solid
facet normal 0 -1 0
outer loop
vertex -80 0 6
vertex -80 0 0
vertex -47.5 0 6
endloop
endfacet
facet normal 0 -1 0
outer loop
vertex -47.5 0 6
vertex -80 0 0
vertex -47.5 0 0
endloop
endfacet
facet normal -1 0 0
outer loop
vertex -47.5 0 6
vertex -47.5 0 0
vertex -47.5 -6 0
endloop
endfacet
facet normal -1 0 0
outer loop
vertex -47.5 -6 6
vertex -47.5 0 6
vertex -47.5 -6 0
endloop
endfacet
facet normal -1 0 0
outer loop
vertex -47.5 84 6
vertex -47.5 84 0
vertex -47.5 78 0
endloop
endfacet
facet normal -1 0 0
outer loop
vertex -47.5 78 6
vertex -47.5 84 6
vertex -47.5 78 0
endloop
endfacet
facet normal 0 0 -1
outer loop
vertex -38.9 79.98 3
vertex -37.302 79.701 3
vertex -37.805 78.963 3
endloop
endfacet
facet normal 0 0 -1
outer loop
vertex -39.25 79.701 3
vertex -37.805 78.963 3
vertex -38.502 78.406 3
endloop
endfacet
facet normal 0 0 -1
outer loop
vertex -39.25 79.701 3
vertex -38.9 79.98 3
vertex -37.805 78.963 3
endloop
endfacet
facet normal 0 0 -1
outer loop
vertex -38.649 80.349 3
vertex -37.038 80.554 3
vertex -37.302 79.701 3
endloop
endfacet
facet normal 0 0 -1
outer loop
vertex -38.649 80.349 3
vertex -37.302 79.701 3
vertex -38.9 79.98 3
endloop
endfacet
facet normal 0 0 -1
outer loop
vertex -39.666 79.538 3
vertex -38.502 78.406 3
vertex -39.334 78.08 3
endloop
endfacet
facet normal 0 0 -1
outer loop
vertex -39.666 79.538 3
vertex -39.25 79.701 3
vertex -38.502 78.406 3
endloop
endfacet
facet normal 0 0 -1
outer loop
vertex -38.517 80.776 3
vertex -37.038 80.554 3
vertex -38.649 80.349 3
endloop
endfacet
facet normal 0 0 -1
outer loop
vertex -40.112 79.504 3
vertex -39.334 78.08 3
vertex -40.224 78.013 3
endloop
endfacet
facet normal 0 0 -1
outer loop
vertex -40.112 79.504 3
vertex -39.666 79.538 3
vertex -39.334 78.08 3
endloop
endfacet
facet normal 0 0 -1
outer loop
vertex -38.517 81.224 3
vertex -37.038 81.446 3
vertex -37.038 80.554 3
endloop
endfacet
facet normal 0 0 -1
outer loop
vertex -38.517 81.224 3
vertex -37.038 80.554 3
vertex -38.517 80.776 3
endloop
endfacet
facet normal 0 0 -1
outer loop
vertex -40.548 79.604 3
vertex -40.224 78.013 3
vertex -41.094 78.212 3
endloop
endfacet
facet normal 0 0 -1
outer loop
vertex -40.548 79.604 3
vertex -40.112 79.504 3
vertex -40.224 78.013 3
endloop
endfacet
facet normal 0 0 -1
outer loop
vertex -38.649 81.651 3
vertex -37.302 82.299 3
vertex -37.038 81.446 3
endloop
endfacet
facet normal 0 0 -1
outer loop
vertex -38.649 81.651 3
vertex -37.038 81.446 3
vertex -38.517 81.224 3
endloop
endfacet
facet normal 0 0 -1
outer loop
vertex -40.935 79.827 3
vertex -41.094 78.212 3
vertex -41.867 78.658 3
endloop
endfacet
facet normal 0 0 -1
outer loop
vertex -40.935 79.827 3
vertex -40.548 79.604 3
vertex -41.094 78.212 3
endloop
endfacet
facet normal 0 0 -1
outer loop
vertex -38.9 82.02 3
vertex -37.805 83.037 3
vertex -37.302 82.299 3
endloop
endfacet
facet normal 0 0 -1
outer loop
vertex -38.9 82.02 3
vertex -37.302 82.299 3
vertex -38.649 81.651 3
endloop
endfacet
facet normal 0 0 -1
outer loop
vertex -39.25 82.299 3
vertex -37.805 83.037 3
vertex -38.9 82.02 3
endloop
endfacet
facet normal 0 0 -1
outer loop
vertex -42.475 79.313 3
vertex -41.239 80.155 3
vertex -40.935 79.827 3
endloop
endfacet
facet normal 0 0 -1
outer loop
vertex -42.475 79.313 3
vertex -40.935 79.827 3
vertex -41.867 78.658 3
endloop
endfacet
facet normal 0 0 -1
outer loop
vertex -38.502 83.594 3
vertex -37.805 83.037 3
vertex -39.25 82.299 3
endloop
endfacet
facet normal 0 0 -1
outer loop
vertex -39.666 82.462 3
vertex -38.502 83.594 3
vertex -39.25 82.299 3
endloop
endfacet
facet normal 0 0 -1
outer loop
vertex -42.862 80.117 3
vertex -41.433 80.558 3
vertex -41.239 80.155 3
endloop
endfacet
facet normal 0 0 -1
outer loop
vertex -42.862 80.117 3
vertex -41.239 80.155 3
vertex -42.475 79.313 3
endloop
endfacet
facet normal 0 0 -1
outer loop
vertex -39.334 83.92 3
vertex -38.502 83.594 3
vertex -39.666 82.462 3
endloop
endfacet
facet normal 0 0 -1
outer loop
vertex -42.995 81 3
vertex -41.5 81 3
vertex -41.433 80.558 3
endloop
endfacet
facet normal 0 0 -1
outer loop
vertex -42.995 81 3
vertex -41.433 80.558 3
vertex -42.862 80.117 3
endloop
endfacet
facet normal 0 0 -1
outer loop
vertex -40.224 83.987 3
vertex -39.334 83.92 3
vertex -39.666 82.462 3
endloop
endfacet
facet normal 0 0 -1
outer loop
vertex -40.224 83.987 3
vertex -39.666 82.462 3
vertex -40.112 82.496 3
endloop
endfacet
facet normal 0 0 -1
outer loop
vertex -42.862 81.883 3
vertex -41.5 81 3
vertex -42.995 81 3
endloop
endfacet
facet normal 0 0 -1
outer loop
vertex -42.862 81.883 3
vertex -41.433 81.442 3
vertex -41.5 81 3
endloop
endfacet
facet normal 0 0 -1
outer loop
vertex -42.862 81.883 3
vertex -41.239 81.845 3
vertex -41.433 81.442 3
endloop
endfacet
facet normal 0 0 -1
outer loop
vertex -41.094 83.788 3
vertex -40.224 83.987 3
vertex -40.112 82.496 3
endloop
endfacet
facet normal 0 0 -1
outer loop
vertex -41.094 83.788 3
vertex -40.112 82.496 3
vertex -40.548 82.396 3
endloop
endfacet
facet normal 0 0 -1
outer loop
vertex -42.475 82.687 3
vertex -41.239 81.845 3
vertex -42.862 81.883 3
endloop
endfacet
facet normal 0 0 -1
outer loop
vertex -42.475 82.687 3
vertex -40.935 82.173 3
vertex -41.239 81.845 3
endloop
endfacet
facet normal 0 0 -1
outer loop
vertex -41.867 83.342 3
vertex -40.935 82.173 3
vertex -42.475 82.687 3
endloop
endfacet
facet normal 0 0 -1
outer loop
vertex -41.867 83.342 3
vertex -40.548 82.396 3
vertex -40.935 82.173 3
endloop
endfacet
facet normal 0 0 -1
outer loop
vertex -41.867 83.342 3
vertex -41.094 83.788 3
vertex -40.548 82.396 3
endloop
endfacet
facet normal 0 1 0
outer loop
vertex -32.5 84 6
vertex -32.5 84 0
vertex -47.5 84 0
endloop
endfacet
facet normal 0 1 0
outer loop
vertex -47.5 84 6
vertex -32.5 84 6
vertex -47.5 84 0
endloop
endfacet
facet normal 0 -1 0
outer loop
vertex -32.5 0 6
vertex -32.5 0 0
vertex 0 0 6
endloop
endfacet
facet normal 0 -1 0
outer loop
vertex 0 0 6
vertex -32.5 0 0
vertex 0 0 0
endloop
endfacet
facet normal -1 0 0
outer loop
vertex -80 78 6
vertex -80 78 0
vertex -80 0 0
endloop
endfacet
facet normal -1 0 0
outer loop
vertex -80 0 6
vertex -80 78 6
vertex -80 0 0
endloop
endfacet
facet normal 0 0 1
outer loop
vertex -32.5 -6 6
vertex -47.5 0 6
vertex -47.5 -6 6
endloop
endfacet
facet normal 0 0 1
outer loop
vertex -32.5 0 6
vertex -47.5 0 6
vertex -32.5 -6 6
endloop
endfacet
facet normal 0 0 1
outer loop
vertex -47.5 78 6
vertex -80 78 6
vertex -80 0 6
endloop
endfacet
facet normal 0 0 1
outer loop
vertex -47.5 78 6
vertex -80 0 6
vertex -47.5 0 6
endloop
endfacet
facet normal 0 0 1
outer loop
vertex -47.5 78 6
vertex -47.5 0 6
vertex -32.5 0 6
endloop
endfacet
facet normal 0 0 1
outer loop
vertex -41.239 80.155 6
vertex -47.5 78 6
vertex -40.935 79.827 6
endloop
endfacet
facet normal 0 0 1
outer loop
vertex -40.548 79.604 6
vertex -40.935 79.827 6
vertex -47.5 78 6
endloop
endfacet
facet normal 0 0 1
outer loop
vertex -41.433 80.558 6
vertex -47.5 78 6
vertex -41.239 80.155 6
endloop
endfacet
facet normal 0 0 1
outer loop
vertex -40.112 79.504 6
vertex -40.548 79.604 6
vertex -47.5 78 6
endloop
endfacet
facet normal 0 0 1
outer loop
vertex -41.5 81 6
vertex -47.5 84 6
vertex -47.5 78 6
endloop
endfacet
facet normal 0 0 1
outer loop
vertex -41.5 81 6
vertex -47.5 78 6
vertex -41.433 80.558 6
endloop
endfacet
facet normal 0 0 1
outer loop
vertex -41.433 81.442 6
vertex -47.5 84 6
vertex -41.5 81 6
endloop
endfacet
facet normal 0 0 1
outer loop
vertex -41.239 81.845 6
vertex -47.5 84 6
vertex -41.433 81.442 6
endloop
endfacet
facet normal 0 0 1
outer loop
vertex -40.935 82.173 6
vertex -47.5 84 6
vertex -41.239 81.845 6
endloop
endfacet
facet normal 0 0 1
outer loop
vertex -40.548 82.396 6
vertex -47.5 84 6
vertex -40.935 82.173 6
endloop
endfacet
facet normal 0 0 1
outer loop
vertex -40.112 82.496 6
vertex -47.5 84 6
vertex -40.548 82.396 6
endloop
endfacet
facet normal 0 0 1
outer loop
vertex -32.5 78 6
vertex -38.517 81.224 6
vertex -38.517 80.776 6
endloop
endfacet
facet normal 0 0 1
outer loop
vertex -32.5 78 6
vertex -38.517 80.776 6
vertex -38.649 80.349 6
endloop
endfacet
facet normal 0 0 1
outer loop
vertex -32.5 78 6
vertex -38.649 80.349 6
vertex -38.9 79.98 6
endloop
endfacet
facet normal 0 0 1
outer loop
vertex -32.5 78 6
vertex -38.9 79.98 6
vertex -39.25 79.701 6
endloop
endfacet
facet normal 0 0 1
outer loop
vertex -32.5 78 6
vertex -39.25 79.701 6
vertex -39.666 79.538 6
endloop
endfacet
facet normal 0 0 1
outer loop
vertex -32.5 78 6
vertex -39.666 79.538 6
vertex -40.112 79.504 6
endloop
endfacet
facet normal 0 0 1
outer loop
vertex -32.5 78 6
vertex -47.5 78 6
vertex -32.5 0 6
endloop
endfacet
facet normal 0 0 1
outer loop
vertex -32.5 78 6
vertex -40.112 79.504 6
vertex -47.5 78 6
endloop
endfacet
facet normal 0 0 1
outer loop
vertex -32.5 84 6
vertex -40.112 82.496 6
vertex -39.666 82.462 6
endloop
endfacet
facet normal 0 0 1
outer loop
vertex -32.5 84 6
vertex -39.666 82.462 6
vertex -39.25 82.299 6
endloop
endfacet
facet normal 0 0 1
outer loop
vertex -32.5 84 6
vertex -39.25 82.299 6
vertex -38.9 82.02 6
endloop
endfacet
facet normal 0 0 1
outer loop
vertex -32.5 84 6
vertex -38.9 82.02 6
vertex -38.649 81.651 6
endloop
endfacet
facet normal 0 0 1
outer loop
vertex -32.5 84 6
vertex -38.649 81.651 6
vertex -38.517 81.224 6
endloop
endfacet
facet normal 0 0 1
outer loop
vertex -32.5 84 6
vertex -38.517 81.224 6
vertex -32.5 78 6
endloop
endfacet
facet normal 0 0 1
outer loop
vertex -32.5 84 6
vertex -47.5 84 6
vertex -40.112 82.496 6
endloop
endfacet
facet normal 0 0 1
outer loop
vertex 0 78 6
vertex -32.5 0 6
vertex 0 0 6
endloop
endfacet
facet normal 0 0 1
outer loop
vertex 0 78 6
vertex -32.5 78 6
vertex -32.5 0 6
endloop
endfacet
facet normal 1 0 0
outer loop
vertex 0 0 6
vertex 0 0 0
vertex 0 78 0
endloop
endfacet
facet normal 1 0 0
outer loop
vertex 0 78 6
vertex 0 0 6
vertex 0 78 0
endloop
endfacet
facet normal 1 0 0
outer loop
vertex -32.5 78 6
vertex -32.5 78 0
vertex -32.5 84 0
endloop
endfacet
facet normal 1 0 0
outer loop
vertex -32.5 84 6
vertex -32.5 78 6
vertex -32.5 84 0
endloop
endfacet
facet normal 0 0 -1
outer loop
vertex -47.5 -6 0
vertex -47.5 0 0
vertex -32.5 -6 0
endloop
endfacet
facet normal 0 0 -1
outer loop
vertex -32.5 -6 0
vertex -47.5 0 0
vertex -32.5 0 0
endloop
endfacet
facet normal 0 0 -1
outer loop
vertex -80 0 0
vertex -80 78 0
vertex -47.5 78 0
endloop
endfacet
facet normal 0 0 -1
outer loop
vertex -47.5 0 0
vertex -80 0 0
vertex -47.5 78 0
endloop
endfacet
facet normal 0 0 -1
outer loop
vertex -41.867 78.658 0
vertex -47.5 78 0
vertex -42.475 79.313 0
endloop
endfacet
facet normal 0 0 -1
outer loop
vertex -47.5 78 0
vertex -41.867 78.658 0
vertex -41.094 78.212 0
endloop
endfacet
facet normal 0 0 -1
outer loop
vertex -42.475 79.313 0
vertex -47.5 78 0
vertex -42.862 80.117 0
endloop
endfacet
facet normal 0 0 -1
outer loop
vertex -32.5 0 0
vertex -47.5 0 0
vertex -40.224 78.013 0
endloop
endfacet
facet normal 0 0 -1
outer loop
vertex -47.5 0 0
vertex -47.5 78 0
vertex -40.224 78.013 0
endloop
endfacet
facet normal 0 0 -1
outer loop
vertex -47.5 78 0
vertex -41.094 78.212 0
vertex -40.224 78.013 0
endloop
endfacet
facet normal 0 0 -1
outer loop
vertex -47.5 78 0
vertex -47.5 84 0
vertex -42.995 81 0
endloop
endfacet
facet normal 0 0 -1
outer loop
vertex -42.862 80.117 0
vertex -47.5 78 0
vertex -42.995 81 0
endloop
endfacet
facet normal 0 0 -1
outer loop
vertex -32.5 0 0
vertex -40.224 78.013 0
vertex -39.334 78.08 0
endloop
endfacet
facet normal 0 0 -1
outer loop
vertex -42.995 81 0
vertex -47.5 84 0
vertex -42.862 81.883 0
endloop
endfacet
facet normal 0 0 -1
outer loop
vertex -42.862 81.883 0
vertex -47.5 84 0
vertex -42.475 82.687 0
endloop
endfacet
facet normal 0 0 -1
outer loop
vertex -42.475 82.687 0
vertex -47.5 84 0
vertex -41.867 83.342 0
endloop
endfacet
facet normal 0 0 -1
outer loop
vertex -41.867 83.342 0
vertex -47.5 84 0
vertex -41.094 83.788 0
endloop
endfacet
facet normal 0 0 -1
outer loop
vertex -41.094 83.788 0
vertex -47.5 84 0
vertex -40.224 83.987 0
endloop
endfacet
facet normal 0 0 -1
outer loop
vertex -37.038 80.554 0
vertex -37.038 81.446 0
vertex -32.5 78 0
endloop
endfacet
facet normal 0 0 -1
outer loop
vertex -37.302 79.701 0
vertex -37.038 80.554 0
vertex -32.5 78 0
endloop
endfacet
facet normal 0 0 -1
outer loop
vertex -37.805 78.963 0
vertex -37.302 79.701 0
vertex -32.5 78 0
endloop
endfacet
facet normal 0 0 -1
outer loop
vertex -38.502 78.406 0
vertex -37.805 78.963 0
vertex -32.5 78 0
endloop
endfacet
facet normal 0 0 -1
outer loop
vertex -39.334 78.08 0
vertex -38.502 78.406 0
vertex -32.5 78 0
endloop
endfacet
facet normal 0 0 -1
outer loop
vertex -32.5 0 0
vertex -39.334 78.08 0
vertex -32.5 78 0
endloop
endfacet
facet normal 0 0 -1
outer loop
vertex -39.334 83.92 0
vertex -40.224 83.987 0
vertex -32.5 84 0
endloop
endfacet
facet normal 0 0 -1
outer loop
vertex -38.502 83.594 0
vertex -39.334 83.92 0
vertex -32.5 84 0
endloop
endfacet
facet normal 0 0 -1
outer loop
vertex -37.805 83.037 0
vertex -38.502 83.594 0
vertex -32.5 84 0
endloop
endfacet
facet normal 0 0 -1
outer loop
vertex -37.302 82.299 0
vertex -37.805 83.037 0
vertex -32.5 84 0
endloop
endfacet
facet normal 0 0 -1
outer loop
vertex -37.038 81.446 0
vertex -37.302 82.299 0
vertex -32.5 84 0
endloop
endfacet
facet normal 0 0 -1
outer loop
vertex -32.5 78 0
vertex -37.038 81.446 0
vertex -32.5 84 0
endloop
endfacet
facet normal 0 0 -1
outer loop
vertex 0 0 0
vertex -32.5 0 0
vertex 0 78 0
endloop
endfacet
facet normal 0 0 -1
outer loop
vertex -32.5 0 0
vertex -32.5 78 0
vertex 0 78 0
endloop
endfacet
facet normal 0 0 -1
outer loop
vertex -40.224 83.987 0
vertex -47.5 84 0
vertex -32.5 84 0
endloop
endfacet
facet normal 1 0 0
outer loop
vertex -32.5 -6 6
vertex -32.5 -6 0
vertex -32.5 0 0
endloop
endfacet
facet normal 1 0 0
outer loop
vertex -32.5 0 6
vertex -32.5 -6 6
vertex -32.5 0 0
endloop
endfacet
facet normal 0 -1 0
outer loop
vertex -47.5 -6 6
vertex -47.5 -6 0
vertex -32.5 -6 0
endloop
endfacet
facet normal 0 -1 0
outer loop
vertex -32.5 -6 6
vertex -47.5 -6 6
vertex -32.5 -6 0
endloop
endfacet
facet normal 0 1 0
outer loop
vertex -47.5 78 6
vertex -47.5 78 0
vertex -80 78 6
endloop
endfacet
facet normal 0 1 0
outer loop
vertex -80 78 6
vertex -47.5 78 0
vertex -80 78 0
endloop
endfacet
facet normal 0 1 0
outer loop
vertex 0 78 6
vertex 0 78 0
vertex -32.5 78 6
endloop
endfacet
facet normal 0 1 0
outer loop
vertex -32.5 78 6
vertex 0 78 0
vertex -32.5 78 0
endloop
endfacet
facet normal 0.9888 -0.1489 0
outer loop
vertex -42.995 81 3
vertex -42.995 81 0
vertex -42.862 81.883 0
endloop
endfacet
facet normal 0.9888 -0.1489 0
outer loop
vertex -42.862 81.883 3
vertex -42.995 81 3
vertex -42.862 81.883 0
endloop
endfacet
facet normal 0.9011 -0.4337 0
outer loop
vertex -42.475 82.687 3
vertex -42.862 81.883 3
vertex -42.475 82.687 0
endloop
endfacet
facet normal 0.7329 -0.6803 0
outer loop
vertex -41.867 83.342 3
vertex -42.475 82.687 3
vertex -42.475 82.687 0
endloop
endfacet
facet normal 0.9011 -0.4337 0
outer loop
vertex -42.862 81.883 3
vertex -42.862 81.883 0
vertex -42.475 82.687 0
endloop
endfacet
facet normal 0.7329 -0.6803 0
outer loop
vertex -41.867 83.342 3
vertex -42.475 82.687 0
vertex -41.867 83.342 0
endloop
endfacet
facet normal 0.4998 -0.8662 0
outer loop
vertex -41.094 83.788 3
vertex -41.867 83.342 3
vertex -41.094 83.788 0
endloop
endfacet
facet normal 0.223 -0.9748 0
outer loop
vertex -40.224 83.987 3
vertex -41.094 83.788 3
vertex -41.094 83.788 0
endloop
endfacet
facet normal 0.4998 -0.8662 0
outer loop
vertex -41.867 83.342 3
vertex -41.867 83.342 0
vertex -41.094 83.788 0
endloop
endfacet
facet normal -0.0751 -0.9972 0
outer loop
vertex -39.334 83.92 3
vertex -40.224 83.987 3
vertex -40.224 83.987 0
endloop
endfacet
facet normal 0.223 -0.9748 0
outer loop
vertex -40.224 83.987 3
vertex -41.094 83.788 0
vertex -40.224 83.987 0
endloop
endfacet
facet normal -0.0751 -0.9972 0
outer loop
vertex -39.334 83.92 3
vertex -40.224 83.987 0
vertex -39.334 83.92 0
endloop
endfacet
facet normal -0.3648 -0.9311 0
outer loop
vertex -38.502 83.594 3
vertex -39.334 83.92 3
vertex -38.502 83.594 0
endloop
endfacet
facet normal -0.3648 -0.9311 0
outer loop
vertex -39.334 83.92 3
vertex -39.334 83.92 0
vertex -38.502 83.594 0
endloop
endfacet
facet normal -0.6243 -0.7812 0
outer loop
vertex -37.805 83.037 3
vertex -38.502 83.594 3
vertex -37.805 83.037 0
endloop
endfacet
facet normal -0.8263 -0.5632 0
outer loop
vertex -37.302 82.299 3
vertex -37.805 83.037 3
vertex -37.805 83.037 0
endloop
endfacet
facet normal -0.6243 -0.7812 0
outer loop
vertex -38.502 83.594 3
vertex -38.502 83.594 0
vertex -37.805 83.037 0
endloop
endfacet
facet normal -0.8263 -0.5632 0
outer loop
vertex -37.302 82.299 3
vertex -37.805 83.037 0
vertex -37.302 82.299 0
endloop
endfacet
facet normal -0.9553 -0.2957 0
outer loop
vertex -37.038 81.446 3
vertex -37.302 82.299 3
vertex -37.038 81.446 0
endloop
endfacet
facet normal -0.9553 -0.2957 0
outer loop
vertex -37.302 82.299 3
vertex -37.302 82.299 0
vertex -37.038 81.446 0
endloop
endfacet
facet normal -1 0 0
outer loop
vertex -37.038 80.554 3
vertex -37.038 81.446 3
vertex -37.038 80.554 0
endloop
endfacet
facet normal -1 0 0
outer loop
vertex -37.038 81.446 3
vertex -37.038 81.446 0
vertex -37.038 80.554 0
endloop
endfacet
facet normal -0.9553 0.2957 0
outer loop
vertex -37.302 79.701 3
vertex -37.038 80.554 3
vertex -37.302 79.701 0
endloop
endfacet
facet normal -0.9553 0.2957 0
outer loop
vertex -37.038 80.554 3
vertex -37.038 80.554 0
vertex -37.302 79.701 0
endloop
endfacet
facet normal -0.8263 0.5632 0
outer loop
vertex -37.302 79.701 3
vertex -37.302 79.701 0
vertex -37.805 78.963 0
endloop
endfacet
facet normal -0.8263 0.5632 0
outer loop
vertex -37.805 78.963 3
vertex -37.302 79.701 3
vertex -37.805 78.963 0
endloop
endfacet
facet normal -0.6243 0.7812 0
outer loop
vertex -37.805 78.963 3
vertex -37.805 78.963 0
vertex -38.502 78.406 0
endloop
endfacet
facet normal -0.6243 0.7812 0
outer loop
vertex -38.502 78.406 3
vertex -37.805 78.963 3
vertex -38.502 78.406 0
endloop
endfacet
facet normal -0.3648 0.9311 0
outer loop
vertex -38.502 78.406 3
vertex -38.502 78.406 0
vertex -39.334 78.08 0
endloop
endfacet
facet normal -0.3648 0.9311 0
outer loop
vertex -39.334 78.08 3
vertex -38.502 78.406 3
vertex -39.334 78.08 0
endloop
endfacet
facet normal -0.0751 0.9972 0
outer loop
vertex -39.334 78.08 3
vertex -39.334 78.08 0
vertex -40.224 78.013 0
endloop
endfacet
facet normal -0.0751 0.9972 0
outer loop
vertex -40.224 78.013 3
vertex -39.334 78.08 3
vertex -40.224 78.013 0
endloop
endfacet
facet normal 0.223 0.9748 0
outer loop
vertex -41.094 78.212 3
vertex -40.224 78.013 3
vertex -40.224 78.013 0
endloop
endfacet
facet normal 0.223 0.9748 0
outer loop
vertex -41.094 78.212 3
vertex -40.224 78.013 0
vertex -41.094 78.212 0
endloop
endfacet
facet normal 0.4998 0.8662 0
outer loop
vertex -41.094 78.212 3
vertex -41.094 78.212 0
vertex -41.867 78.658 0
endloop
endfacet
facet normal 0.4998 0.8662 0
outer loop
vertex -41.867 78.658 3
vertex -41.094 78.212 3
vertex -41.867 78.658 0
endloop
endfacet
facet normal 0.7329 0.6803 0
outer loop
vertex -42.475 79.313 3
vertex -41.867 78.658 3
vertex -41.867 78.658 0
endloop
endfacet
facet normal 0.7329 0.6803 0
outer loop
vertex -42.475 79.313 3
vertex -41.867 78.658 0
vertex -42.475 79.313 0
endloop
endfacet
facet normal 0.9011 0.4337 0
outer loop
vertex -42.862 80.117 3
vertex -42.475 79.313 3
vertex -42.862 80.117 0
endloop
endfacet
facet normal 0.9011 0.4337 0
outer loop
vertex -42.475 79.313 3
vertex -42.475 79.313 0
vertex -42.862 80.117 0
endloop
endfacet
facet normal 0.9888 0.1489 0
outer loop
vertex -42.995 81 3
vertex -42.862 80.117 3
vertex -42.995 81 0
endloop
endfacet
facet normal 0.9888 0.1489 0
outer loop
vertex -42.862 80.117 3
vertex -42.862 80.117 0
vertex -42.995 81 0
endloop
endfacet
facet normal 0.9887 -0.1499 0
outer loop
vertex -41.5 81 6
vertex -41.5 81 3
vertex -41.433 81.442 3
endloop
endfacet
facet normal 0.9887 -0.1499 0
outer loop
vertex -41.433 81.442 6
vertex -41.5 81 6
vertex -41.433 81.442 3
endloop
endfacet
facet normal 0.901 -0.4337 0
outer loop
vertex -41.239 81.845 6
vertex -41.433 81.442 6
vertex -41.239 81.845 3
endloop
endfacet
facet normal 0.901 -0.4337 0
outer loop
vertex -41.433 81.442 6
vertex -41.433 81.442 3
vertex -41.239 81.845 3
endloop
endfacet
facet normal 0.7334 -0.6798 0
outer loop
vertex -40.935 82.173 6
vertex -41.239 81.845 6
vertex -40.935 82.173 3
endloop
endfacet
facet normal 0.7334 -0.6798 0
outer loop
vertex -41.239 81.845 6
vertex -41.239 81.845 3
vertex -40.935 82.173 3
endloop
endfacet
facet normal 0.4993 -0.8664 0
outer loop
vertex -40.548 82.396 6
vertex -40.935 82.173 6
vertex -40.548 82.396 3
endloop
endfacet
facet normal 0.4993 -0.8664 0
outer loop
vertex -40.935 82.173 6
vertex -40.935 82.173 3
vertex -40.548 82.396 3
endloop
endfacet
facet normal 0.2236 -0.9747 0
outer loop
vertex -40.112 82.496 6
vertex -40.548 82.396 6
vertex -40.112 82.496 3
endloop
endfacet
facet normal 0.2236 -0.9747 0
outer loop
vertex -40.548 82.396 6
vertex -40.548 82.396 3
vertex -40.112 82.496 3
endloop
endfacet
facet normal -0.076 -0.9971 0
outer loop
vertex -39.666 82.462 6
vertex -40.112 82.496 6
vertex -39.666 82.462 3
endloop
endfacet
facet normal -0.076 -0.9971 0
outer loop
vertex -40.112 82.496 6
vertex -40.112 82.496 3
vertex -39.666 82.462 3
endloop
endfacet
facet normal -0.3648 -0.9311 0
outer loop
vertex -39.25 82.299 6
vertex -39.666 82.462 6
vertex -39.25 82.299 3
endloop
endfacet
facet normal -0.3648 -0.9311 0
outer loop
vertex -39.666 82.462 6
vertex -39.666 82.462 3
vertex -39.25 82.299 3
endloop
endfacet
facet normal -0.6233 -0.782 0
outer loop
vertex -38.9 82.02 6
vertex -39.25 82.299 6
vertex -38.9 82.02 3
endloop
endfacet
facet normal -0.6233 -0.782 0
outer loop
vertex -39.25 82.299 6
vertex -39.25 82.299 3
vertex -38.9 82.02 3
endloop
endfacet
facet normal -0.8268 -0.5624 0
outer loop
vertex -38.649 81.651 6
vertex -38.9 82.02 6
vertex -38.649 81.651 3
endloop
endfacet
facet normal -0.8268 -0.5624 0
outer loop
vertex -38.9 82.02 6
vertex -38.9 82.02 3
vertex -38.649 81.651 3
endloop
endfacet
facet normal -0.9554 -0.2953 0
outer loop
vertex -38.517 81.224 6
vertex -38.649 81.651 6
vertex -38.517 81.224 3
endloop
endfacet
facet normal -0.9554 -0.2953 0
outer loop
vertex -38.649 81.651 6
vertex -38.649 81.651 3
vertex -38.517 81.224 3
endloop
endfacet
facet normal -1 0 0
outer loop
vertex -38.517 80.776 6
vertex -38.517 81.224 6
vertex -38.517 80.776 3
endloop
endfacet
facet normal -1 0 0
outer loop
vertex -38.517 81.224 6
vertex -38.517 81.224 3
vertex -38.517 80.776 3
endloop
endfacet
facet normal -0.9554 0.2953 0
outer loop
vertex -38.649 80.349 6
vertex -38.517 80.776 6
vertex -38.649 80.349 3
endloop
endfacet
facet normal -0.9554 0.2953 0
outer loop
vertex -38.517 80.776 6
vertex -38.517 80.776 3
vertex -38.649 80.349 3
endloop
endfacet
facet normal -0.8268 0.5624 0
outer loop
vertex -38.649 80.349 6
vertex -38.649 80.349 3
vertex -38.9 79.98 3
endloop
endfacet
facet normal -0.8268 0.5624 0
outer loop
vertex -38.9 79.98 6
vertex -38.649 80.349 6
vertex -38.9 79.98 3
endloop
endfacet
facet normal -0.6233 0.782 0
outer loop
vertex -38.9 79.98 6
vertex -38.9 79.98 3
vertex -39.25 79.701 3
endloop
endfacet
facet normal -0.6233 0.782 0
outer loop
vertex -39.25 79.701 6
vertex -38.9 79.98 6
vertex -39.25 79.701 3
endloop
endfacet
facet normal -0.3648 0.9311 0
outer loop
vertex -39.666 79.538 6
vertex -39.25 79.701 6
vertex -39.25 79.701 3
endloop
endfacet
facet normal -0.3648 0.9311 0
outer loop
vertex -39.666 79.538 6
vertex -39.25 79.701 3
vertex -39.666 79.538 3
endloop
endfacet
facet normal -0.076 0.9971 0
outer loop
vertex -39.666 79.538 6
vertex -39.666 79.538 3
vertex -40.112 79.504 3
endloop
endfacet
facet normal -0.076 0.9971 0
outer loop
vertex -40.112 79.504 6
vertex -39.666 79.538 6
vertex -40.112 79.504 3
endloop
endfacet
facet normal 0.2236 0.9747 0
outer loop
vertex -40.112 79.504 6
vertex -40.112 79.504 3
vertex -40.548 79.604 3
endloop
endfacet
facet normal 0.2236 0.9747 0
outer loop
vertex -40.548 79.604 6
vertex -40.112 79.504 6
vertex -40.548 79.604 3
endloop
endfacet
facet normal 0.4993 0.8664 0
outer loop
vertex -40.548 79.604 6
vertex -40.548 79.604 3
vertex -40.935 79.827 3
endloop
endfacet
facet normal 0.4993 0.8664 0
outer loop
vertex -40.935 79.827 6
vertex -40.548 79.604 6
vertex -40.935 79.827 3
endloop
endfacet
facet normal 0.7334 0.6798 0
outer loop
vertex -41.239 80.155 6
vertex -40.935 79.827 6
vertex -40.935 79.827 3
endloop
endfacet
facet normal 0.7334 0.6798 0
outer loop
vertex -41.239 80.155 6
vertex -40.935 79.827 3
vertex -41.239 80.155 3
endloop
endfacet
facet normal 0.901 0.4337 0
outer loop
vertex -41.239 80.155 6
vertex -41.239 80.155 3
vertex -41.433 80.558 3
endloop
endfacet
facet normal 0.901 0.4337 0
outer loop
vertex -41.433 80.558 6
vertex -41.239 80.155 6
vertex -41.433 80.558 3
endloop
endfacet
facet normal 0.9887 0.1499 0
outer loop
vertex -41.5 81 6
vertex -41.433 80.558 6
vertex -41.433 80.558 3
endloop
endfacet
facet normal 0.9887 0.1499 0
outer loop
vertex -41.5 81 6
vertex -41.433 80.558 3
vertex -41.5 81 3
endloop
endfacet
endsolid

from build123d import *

# Parameters (mm, degrees)
BOSS_EXTRU_1_DEPTH      = 6
ESQUISSE2_R             = 1.5
ENL_V_MAT_EXTRU_1_DEPTH = 6
ESQUISSE3_R             = 2.995
ENL_V_MAT_EXTRU_2_DEPTH = 3


with BuildPart() as part:
    # Esquisse1 → Boss.-Extru.1 (new body)
    with BuildSketch(Plane.XY):
        Polygon((-47.5, 78), (-80, 78), (-80, 0), (-47.5, 0), (-47.5, -6), (-32.5, -6), (-32.5, 0), (0, 0), (0, 78), (-32.5, 78), (-32.5, 84), (-47.5, 84), align=None)
    extrude(amount=BOSS_EXTRU_1_DEPTH)

    # Esquisse2 → Enlèv. mat.-Extru.1 (cut)
    with BuildSketch(Plane(origin=(0, 0, 0), x_dir=(-1, 0, 0), z_dir=(0, 0, -1))):
        with Locations((40, 81)):
            Circle(ESQUISSE2_R)
    extrude(amount=-ENL_V_MAT_EXTRU_1_DEPTH, mode=Mode.SUBTRACT)

    # Esquisse3 → Enlèv. mat.-Extru.2 (cut)
    with BuildSketch(Plane(origin=(0, 0, 0), x_dir=(-1, 0, 0), z_dir=(0, 0, -1))):
        with Locations((40, 81)):
            Circle(ESQUISSE3_R)
    extrude(amount=-ENL_V_MAT_EXTRU_2_DEPTH, mode=Mode.SUBTRACT)


solid = part.part
